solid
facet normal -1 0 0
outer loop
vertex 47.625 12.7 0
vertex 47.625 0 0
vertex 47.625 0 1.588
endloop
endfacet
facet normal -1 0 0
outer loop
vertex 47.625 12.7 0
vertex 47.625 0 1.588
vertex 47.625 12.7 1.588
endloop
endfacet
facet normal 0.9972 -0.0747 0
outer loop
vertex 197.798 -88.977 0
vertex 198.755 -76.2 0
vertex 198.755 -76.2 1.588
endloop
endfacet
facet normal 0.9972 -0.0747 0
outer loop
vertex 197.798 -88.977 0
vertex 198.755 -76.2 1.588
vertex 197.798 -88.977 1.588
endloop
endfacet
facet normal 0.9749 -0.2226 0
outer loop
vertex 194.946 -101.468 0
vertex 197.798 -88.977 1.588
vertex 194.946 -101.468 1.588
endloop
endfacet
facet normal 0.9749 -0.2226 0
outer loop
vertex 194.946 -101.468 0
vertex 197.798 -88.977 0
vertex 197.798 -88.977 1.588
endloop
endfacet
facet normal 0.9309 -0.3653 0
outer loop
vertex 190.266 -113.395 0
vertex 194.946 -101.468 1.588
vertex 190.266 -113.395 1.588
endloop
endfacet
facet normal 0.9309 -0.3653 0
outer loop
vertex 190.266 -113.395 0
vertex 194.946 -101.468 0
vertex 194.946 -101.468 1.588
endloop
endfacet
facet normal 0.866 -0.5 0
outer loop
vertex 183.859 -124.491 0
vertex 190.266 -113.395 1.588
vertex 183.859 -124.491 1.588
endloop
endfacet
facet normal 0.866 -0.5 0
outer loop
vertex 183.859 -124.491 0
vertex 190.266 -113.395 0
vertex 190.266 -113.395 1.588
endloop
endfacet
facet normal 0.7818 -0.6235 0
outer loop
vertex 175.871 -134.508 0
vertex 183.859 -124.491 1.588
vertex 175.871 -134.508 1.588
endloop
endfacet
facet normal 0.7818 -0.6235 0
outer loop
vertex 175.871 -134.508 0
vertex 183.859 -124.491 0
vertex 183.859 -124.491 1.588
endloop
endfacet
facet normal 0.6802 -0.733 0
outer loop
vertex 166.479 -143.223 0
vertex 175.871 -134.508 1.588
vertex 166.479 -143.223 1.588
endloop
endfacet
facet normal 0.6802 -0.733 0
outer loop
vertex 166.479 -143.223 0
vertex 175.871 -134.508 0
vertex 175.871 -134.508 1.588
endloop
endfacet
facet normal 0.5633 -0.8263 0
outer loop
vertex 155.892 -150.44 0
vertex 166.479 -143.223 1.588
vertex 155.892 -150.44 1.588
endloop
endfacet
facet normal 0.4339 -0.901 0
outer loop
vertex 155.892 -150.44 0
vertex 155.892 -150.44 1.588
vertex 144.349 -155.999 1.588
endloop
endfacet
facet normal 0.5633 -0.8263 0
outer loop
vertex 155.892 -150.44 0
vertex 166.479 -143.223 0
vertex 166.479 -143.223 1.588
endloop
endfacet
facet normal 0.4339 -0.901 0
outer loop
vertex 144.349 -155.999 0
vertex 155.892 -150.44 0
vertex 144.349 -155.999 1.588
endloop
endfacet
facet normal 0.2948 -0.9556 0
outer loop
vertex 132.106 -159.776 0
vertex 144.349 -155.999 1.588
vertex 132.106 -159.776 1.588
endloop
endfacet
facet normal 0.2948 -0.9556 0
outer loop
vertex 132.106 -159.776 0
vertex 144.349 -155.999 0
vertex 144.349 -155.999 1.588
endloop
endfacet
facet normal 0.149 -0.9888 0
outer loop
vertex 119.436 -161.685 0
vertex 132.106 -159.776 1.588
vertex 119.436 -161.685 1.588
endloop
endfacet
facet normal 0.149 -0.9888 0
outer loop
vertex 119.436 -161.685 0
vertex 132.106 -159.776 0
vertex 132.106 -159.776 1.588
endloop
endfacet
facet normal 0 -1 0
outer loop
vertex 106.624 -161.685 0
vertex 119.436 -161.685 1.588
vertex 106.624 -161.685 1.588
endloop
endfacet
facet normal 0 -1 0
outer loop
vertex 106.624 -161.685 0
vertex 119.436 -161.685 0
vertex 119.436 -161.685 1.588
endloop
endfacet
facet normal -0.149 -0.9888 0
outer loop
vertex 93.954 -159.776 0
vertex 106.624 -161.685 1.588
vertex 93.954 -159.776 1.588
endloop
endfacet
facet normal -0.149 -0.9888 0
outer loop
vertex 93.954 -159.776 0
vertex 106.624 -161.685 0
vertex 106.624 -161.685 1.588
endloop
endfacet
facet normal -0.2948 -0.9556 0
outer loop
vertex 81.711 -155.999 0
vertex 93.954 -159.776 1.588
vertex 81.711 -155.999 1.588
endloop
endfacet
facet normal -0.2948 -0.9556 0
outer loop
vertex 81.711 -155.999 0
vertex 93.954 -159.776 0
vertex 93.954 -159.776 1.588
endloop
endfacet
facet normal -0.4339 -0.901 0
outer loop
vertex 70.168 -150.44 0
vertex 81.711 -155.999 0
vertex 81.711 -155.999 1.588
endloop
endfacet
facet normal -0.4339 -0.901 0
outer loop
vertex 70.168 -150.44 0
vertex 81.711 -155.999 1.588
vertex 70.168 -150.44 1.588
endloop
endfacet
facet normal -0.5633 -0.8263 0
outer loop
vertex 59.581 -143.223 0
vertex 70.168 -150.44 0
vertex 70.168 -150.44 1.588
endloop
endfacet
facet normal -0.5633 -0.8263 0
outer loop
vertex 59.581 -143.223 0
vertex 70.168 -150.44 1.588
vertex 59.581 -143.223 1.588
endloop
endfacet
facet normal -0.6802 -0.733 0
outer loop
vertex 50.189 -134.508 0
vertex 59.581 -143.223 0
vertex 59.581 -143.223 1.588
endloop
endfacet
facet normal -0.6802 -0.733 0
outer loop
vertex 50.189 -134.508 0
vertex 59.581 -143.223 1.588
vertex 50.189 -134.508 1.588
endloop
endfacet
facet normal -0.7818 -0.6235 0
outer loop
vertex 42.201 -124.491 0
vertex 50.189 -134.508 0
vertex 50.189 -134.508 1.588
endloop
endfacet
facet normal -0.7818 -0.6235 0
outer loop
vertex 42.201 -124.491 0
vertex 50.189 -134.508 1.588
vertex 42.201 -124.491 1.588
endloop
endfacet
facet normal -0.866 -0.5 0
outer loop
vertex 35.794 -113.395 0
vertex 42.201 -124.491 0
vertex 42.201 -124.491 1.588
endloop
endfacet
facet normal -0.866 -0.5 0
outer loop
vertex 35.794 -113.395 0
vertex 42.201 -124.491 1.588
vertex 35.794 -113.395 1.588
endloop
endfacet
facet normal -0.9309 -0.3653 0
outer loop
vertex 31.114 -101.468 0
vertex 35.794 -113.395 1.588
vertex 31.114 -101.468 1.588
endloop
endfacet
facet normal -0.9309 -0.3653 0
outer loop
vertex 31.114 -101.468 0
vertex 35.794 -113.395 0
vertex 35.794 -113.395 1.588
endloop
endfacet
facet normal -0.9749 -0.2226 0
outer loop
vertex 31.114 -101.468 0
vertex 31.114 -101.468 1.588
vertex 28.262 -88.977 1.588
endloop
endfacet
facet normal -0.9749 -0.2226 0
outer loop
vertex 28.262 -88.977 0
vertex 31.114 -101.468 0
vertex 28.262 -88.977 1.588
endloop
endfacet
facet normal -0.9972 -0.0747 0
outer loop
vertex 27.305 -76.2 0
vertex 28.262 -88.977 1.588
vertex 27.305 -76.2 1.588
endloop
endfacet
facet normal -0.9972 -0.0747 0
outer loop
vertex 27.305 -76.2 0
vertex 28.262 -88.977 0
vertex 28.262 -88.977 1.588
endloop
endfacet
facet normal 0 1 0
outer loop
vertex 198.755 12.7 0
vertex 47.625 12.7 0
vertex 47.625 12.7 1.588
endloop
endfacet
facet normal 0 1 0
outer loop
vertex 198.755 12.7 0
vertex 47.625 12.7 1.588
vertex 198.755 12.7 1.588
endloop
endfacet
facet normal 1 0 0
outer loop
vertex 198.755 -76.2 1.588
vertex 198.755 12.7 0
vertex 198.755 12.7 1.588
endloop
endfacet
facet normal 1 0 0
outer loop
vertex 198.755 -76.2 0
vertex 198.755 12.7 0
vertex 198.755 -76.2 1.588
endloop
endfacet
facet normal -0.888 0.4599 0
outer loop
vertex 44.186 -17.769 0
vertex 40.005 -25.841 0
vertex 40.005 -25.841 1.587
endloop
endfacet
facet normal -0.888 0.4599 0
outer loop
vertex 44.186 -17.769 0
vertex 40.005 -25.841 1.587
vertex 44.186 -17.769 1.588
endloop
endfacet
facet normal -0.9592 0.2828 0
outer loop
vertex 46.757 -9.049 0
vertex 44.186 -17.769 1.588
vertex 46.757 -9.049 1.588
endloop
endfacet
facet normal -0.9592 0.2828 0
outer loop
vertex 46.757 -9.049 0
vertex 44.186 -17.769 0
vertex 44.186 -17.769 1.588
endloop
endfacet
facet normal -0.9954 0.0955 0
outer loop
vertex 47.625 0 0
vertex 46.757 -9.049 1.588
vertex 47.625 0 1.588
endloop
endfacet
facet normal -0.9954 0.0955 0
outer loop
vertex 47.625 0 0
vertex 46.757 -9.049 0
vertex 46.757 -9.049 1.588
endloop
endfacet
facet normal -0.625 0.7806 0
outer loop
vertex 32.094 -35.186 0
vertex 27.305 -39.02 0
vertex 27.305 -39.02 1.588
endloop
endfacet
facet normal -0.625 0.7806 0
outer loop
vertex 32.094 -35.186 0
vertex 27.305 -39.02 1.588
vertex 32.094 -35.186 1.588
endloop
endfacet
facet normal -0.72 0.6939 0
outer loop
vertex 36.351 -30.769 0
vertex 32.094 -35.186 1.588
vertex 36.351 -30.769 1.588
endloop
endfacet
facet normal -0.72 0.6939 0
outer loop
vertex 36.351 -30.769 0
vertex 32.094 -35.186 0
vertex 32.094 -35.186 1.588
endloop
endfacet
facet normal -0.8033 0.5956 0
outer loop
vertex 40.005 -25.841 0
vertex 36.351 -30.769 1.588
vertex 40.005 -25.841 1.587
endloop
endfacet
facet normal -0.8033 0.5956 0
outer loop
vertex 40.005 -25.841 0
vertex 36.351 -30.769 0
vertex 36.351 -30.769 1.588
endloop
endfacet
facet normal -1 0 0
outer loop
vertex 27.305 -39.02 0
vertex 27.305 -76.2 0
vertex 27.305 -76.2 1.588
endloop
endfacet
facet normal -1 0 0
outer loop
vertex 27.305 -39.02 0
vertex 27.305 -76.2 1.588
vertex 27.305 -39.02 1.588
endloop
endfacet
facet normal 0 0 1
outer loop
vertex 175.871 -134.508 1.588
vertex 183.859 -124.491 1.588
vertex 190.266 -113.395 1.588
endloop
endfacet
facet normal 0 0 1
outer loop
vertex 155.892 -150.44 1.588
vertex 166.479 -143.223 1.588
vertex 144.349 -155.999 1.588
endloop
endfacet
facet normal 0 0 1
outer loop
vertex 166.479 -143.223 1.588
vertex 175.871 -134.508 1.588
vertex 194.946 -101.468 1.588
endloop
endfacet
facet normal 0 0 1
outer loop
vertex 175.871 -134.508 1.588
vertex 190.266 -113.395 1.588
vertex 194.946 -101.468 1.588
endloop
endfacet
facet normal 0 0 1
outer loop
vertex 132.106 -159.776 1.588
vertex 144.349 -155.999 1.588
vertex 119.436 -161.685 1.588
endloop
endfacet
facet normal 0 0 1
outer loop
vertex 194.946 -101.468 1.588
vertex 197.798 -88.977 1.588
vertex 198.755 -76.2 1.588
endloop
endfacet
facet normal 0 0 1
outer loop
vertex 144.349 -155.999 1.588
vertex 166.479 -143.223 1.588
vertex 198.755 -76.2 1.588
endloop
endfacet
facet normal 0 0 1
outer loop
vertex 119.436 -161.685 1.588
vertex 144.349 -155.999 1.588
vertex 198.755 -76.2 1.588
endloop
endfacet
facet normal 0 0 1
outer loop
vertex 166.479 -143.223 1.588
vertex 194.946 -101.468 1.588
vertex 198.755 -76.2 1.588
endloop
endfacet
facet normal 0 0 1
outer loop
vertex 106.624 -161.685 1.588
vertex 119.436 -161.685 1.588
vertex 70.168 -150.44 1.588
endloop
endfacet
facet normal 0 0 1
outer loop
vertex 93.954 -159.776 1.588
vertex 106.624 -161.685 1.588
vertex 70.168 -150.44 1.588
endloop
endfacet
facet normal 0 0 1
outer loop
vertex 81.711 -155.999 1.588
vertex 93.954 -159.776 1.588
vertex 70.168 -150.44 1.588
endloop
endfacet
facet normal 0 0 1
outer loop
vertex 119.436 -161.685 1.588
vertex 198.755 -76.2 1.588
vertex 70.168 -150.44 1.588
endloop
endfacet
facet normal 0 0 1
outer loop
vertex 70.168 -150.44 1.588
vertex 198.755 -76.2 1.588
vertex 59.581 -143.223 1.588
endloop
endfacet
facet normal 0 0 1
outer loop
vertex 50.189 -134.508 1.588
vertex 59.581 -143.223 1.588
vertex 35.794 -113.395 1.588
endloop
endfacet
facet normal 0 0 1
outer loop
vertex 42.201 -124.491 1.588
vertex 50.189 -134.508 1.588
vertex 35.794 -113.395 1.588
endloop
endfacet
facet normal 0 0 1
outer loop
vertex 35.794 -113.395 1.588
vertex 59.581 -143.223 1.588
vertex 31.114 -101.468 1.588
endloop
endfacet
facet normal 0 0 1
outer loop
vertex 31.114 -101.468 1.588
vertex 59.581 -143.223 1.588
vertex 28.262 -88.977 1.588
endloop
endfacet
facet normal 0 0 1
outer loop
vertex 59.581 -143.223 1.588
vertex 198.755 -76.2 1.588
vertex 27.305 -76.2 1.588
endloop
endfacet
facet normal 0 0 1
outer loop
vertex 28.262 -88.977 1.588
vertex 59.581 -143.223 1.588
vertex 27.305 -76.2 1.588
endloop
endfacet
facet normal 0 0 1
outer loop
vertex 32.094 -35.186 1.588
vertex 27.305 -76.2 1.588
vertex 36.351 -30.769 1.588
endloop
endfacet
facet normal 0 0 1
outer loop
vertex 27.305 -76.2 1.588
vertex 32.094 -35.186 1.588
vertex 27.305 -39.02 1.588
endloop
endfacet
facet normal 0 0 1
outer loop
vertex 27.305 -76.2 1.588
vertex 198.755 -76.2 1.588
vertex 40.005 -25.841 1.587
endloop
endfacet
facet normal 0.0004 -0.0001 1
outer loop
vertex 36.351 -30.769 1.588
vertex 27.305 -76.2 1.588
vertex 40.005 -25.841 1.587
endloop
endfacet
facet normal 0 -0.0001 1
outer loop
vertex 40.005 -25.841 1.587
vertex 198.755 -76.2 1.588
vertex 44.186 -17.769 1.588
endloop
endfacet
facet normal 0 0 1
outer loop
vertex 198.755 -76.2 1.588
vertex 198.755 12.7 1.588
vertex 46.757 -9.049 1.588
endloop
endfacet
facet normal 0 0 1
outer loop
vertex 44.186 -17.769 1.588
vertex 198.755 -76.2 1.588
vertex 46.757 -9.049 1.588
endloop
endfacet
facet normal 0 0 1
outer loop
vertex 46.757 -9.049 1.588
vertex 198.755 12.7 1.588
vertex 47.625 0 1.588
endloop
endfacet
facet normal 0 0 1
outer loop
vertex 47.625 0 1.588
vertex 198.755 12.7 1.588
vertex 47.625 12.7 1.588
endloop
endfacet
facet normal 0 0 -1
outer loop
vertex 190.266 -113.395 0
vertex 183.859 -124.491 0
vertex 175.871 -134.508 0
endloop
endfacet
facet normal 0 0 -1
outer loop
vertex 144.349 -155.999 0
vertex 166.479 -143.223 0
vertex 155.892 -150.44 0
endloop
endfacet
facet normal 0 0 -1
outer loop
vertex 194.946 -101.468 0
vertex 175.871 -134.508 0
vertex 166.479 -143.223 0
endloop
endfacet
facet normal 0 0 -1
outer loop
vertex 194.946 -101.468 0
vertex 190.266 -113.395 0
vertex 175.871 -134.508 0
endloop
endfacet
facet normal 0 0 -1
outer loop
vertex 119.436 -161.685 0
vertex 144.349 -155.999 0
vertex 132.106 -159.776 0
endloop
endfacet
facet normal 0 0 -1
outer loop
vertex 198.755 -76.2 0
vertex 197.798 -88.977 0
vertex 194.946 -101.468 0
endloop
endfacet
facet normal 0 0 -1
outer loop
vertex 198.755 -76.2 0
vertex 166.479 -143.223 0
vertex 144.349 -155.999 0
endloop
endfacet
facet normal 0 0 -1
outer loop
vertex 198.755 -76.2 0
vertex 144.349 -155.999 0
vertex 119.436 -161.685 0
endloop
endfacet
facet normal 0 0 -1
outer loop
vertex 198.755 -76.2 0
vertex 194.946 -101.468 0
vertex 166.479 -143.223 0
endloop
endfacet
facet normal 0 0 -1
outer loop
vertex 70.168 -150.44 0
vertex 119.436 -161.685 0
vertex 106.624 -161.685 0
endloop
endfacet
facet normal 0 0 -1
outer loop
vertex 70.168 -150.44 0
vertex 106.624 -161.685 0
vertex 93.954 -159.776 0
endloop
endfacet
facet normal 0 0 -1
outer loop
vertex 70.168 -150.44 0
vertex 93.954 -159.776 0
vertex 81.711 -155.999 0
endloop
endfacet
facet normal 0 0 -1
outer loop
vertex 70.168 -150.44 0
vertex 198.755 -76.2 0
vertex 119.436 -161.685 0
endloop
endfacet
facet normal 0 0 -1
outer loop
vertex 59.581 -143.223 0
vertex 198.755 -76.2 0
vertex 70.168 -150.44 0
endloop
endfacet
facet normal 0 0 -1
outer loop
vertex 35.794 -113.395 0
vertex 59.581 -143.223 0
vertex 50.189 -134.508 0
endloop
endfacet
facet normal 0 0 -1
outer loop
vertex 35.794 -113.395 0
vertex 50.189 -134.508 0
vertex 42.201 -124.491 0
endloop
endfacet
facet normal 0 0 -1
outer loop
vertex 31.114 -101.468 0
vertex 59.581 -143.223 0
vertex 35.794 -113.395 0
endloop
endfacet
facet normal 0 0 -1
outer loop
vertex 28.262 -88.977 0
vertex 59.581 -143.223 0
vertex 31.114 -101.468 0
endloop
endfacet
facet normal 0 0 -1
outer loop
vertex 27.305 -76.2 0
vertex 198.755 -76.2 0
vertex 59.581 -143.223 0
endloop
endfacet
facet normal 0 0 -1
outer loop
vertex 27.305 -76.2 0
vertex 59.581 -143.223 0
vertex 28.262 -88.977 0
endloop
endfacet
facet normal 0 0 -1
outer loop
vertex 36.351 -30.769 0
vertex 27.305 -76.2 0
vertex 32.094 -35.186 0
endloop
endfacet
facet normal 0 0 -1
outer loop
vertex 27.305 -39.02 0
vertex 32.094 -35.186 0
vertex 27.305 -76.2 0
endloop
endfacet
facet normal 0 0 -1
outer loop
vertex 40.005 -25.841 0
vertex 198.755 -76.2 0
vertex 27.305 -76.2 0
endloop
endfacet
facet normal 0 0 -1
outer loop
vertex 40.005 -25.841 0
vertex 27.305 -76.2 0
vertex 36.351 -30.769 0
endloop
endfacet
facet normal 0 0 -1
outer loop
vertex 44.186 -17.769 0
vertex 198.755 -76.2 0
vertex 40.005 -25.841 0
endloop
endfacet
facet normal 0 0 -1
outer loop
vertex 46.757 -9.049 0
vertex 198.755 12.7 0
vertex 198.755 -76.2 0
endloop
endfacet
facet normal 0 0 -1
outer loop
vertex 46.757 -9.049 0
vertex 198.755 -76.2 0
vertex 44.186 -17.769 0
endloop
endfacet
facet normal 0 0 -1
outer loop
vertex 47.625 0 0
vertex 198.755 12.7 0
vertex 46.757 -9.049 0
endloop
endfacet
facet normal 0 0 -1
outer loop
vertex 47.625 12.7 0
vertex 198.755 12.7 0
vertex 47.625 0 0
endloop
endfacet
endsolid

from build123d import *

# Parameters (mm, degrees)
BOSS_EXTRUDE1_DEPTH = 1.5875
BOSS_EXTRUDE2_DEPTH = 1.5875


with BuildPart() as part:
    # Sketch1 → Boss-Extrude1 (new body)
    with BuildSketch(Plane.XY):
        with BuildLine():
            Line((40.005, -76.2), (40.005, -25.840677236))
            ThreePointArc((40.005, -25.840677236), (45.68029526, -13.470384182), (47.625, 0))
            Line((47.625, 0), (47.625, 12.7))
            Line((47.625, 12.7), (186.055, 12.7))
            Line((186.055, 12.7), (186.055, 0))
            Line((186.055, 0), (186.055, -76.2))
            ThreePointArc((186.055, -76.2), (113.03, -149.225), (40.005, -76.2))
        make_face()
    extrude(amount=BOSS_EXTRUDE1_DEPTH)

    # Sketch2 → Boss-Extrude2 (add)
    with BuildSketch(Plane.XY):
        with BuildLine():
            Line((186.055, -76.2), (186.055, 0))
            Line((186.055, 0), (186.055, 12.7))
            Line((186.055, 12.7), (198.755, 12.7))
            Line((198.755, 12.7), (198.755, -76.2))
            ThreePointArc((198.755, -76.2), (113.03, -161.925), (27.305, -76.2))
            Line((27.305, -76.2), (27.305, -39.020220399))
            ThreePointArc((27.305, -39.020220399), (34.294082791, -33.046278315), (40.005, -25.840677236))
            Line((40.005, -25.840677236), (40.005, -76.2))
            ThreePointArc((40.005, -76.2), (113.03, -149.225), (186.055, -76.2))
        make_face()
    extrude(amount=BOSS_EXTRUDE2_DEPTH)


solid = part.part
